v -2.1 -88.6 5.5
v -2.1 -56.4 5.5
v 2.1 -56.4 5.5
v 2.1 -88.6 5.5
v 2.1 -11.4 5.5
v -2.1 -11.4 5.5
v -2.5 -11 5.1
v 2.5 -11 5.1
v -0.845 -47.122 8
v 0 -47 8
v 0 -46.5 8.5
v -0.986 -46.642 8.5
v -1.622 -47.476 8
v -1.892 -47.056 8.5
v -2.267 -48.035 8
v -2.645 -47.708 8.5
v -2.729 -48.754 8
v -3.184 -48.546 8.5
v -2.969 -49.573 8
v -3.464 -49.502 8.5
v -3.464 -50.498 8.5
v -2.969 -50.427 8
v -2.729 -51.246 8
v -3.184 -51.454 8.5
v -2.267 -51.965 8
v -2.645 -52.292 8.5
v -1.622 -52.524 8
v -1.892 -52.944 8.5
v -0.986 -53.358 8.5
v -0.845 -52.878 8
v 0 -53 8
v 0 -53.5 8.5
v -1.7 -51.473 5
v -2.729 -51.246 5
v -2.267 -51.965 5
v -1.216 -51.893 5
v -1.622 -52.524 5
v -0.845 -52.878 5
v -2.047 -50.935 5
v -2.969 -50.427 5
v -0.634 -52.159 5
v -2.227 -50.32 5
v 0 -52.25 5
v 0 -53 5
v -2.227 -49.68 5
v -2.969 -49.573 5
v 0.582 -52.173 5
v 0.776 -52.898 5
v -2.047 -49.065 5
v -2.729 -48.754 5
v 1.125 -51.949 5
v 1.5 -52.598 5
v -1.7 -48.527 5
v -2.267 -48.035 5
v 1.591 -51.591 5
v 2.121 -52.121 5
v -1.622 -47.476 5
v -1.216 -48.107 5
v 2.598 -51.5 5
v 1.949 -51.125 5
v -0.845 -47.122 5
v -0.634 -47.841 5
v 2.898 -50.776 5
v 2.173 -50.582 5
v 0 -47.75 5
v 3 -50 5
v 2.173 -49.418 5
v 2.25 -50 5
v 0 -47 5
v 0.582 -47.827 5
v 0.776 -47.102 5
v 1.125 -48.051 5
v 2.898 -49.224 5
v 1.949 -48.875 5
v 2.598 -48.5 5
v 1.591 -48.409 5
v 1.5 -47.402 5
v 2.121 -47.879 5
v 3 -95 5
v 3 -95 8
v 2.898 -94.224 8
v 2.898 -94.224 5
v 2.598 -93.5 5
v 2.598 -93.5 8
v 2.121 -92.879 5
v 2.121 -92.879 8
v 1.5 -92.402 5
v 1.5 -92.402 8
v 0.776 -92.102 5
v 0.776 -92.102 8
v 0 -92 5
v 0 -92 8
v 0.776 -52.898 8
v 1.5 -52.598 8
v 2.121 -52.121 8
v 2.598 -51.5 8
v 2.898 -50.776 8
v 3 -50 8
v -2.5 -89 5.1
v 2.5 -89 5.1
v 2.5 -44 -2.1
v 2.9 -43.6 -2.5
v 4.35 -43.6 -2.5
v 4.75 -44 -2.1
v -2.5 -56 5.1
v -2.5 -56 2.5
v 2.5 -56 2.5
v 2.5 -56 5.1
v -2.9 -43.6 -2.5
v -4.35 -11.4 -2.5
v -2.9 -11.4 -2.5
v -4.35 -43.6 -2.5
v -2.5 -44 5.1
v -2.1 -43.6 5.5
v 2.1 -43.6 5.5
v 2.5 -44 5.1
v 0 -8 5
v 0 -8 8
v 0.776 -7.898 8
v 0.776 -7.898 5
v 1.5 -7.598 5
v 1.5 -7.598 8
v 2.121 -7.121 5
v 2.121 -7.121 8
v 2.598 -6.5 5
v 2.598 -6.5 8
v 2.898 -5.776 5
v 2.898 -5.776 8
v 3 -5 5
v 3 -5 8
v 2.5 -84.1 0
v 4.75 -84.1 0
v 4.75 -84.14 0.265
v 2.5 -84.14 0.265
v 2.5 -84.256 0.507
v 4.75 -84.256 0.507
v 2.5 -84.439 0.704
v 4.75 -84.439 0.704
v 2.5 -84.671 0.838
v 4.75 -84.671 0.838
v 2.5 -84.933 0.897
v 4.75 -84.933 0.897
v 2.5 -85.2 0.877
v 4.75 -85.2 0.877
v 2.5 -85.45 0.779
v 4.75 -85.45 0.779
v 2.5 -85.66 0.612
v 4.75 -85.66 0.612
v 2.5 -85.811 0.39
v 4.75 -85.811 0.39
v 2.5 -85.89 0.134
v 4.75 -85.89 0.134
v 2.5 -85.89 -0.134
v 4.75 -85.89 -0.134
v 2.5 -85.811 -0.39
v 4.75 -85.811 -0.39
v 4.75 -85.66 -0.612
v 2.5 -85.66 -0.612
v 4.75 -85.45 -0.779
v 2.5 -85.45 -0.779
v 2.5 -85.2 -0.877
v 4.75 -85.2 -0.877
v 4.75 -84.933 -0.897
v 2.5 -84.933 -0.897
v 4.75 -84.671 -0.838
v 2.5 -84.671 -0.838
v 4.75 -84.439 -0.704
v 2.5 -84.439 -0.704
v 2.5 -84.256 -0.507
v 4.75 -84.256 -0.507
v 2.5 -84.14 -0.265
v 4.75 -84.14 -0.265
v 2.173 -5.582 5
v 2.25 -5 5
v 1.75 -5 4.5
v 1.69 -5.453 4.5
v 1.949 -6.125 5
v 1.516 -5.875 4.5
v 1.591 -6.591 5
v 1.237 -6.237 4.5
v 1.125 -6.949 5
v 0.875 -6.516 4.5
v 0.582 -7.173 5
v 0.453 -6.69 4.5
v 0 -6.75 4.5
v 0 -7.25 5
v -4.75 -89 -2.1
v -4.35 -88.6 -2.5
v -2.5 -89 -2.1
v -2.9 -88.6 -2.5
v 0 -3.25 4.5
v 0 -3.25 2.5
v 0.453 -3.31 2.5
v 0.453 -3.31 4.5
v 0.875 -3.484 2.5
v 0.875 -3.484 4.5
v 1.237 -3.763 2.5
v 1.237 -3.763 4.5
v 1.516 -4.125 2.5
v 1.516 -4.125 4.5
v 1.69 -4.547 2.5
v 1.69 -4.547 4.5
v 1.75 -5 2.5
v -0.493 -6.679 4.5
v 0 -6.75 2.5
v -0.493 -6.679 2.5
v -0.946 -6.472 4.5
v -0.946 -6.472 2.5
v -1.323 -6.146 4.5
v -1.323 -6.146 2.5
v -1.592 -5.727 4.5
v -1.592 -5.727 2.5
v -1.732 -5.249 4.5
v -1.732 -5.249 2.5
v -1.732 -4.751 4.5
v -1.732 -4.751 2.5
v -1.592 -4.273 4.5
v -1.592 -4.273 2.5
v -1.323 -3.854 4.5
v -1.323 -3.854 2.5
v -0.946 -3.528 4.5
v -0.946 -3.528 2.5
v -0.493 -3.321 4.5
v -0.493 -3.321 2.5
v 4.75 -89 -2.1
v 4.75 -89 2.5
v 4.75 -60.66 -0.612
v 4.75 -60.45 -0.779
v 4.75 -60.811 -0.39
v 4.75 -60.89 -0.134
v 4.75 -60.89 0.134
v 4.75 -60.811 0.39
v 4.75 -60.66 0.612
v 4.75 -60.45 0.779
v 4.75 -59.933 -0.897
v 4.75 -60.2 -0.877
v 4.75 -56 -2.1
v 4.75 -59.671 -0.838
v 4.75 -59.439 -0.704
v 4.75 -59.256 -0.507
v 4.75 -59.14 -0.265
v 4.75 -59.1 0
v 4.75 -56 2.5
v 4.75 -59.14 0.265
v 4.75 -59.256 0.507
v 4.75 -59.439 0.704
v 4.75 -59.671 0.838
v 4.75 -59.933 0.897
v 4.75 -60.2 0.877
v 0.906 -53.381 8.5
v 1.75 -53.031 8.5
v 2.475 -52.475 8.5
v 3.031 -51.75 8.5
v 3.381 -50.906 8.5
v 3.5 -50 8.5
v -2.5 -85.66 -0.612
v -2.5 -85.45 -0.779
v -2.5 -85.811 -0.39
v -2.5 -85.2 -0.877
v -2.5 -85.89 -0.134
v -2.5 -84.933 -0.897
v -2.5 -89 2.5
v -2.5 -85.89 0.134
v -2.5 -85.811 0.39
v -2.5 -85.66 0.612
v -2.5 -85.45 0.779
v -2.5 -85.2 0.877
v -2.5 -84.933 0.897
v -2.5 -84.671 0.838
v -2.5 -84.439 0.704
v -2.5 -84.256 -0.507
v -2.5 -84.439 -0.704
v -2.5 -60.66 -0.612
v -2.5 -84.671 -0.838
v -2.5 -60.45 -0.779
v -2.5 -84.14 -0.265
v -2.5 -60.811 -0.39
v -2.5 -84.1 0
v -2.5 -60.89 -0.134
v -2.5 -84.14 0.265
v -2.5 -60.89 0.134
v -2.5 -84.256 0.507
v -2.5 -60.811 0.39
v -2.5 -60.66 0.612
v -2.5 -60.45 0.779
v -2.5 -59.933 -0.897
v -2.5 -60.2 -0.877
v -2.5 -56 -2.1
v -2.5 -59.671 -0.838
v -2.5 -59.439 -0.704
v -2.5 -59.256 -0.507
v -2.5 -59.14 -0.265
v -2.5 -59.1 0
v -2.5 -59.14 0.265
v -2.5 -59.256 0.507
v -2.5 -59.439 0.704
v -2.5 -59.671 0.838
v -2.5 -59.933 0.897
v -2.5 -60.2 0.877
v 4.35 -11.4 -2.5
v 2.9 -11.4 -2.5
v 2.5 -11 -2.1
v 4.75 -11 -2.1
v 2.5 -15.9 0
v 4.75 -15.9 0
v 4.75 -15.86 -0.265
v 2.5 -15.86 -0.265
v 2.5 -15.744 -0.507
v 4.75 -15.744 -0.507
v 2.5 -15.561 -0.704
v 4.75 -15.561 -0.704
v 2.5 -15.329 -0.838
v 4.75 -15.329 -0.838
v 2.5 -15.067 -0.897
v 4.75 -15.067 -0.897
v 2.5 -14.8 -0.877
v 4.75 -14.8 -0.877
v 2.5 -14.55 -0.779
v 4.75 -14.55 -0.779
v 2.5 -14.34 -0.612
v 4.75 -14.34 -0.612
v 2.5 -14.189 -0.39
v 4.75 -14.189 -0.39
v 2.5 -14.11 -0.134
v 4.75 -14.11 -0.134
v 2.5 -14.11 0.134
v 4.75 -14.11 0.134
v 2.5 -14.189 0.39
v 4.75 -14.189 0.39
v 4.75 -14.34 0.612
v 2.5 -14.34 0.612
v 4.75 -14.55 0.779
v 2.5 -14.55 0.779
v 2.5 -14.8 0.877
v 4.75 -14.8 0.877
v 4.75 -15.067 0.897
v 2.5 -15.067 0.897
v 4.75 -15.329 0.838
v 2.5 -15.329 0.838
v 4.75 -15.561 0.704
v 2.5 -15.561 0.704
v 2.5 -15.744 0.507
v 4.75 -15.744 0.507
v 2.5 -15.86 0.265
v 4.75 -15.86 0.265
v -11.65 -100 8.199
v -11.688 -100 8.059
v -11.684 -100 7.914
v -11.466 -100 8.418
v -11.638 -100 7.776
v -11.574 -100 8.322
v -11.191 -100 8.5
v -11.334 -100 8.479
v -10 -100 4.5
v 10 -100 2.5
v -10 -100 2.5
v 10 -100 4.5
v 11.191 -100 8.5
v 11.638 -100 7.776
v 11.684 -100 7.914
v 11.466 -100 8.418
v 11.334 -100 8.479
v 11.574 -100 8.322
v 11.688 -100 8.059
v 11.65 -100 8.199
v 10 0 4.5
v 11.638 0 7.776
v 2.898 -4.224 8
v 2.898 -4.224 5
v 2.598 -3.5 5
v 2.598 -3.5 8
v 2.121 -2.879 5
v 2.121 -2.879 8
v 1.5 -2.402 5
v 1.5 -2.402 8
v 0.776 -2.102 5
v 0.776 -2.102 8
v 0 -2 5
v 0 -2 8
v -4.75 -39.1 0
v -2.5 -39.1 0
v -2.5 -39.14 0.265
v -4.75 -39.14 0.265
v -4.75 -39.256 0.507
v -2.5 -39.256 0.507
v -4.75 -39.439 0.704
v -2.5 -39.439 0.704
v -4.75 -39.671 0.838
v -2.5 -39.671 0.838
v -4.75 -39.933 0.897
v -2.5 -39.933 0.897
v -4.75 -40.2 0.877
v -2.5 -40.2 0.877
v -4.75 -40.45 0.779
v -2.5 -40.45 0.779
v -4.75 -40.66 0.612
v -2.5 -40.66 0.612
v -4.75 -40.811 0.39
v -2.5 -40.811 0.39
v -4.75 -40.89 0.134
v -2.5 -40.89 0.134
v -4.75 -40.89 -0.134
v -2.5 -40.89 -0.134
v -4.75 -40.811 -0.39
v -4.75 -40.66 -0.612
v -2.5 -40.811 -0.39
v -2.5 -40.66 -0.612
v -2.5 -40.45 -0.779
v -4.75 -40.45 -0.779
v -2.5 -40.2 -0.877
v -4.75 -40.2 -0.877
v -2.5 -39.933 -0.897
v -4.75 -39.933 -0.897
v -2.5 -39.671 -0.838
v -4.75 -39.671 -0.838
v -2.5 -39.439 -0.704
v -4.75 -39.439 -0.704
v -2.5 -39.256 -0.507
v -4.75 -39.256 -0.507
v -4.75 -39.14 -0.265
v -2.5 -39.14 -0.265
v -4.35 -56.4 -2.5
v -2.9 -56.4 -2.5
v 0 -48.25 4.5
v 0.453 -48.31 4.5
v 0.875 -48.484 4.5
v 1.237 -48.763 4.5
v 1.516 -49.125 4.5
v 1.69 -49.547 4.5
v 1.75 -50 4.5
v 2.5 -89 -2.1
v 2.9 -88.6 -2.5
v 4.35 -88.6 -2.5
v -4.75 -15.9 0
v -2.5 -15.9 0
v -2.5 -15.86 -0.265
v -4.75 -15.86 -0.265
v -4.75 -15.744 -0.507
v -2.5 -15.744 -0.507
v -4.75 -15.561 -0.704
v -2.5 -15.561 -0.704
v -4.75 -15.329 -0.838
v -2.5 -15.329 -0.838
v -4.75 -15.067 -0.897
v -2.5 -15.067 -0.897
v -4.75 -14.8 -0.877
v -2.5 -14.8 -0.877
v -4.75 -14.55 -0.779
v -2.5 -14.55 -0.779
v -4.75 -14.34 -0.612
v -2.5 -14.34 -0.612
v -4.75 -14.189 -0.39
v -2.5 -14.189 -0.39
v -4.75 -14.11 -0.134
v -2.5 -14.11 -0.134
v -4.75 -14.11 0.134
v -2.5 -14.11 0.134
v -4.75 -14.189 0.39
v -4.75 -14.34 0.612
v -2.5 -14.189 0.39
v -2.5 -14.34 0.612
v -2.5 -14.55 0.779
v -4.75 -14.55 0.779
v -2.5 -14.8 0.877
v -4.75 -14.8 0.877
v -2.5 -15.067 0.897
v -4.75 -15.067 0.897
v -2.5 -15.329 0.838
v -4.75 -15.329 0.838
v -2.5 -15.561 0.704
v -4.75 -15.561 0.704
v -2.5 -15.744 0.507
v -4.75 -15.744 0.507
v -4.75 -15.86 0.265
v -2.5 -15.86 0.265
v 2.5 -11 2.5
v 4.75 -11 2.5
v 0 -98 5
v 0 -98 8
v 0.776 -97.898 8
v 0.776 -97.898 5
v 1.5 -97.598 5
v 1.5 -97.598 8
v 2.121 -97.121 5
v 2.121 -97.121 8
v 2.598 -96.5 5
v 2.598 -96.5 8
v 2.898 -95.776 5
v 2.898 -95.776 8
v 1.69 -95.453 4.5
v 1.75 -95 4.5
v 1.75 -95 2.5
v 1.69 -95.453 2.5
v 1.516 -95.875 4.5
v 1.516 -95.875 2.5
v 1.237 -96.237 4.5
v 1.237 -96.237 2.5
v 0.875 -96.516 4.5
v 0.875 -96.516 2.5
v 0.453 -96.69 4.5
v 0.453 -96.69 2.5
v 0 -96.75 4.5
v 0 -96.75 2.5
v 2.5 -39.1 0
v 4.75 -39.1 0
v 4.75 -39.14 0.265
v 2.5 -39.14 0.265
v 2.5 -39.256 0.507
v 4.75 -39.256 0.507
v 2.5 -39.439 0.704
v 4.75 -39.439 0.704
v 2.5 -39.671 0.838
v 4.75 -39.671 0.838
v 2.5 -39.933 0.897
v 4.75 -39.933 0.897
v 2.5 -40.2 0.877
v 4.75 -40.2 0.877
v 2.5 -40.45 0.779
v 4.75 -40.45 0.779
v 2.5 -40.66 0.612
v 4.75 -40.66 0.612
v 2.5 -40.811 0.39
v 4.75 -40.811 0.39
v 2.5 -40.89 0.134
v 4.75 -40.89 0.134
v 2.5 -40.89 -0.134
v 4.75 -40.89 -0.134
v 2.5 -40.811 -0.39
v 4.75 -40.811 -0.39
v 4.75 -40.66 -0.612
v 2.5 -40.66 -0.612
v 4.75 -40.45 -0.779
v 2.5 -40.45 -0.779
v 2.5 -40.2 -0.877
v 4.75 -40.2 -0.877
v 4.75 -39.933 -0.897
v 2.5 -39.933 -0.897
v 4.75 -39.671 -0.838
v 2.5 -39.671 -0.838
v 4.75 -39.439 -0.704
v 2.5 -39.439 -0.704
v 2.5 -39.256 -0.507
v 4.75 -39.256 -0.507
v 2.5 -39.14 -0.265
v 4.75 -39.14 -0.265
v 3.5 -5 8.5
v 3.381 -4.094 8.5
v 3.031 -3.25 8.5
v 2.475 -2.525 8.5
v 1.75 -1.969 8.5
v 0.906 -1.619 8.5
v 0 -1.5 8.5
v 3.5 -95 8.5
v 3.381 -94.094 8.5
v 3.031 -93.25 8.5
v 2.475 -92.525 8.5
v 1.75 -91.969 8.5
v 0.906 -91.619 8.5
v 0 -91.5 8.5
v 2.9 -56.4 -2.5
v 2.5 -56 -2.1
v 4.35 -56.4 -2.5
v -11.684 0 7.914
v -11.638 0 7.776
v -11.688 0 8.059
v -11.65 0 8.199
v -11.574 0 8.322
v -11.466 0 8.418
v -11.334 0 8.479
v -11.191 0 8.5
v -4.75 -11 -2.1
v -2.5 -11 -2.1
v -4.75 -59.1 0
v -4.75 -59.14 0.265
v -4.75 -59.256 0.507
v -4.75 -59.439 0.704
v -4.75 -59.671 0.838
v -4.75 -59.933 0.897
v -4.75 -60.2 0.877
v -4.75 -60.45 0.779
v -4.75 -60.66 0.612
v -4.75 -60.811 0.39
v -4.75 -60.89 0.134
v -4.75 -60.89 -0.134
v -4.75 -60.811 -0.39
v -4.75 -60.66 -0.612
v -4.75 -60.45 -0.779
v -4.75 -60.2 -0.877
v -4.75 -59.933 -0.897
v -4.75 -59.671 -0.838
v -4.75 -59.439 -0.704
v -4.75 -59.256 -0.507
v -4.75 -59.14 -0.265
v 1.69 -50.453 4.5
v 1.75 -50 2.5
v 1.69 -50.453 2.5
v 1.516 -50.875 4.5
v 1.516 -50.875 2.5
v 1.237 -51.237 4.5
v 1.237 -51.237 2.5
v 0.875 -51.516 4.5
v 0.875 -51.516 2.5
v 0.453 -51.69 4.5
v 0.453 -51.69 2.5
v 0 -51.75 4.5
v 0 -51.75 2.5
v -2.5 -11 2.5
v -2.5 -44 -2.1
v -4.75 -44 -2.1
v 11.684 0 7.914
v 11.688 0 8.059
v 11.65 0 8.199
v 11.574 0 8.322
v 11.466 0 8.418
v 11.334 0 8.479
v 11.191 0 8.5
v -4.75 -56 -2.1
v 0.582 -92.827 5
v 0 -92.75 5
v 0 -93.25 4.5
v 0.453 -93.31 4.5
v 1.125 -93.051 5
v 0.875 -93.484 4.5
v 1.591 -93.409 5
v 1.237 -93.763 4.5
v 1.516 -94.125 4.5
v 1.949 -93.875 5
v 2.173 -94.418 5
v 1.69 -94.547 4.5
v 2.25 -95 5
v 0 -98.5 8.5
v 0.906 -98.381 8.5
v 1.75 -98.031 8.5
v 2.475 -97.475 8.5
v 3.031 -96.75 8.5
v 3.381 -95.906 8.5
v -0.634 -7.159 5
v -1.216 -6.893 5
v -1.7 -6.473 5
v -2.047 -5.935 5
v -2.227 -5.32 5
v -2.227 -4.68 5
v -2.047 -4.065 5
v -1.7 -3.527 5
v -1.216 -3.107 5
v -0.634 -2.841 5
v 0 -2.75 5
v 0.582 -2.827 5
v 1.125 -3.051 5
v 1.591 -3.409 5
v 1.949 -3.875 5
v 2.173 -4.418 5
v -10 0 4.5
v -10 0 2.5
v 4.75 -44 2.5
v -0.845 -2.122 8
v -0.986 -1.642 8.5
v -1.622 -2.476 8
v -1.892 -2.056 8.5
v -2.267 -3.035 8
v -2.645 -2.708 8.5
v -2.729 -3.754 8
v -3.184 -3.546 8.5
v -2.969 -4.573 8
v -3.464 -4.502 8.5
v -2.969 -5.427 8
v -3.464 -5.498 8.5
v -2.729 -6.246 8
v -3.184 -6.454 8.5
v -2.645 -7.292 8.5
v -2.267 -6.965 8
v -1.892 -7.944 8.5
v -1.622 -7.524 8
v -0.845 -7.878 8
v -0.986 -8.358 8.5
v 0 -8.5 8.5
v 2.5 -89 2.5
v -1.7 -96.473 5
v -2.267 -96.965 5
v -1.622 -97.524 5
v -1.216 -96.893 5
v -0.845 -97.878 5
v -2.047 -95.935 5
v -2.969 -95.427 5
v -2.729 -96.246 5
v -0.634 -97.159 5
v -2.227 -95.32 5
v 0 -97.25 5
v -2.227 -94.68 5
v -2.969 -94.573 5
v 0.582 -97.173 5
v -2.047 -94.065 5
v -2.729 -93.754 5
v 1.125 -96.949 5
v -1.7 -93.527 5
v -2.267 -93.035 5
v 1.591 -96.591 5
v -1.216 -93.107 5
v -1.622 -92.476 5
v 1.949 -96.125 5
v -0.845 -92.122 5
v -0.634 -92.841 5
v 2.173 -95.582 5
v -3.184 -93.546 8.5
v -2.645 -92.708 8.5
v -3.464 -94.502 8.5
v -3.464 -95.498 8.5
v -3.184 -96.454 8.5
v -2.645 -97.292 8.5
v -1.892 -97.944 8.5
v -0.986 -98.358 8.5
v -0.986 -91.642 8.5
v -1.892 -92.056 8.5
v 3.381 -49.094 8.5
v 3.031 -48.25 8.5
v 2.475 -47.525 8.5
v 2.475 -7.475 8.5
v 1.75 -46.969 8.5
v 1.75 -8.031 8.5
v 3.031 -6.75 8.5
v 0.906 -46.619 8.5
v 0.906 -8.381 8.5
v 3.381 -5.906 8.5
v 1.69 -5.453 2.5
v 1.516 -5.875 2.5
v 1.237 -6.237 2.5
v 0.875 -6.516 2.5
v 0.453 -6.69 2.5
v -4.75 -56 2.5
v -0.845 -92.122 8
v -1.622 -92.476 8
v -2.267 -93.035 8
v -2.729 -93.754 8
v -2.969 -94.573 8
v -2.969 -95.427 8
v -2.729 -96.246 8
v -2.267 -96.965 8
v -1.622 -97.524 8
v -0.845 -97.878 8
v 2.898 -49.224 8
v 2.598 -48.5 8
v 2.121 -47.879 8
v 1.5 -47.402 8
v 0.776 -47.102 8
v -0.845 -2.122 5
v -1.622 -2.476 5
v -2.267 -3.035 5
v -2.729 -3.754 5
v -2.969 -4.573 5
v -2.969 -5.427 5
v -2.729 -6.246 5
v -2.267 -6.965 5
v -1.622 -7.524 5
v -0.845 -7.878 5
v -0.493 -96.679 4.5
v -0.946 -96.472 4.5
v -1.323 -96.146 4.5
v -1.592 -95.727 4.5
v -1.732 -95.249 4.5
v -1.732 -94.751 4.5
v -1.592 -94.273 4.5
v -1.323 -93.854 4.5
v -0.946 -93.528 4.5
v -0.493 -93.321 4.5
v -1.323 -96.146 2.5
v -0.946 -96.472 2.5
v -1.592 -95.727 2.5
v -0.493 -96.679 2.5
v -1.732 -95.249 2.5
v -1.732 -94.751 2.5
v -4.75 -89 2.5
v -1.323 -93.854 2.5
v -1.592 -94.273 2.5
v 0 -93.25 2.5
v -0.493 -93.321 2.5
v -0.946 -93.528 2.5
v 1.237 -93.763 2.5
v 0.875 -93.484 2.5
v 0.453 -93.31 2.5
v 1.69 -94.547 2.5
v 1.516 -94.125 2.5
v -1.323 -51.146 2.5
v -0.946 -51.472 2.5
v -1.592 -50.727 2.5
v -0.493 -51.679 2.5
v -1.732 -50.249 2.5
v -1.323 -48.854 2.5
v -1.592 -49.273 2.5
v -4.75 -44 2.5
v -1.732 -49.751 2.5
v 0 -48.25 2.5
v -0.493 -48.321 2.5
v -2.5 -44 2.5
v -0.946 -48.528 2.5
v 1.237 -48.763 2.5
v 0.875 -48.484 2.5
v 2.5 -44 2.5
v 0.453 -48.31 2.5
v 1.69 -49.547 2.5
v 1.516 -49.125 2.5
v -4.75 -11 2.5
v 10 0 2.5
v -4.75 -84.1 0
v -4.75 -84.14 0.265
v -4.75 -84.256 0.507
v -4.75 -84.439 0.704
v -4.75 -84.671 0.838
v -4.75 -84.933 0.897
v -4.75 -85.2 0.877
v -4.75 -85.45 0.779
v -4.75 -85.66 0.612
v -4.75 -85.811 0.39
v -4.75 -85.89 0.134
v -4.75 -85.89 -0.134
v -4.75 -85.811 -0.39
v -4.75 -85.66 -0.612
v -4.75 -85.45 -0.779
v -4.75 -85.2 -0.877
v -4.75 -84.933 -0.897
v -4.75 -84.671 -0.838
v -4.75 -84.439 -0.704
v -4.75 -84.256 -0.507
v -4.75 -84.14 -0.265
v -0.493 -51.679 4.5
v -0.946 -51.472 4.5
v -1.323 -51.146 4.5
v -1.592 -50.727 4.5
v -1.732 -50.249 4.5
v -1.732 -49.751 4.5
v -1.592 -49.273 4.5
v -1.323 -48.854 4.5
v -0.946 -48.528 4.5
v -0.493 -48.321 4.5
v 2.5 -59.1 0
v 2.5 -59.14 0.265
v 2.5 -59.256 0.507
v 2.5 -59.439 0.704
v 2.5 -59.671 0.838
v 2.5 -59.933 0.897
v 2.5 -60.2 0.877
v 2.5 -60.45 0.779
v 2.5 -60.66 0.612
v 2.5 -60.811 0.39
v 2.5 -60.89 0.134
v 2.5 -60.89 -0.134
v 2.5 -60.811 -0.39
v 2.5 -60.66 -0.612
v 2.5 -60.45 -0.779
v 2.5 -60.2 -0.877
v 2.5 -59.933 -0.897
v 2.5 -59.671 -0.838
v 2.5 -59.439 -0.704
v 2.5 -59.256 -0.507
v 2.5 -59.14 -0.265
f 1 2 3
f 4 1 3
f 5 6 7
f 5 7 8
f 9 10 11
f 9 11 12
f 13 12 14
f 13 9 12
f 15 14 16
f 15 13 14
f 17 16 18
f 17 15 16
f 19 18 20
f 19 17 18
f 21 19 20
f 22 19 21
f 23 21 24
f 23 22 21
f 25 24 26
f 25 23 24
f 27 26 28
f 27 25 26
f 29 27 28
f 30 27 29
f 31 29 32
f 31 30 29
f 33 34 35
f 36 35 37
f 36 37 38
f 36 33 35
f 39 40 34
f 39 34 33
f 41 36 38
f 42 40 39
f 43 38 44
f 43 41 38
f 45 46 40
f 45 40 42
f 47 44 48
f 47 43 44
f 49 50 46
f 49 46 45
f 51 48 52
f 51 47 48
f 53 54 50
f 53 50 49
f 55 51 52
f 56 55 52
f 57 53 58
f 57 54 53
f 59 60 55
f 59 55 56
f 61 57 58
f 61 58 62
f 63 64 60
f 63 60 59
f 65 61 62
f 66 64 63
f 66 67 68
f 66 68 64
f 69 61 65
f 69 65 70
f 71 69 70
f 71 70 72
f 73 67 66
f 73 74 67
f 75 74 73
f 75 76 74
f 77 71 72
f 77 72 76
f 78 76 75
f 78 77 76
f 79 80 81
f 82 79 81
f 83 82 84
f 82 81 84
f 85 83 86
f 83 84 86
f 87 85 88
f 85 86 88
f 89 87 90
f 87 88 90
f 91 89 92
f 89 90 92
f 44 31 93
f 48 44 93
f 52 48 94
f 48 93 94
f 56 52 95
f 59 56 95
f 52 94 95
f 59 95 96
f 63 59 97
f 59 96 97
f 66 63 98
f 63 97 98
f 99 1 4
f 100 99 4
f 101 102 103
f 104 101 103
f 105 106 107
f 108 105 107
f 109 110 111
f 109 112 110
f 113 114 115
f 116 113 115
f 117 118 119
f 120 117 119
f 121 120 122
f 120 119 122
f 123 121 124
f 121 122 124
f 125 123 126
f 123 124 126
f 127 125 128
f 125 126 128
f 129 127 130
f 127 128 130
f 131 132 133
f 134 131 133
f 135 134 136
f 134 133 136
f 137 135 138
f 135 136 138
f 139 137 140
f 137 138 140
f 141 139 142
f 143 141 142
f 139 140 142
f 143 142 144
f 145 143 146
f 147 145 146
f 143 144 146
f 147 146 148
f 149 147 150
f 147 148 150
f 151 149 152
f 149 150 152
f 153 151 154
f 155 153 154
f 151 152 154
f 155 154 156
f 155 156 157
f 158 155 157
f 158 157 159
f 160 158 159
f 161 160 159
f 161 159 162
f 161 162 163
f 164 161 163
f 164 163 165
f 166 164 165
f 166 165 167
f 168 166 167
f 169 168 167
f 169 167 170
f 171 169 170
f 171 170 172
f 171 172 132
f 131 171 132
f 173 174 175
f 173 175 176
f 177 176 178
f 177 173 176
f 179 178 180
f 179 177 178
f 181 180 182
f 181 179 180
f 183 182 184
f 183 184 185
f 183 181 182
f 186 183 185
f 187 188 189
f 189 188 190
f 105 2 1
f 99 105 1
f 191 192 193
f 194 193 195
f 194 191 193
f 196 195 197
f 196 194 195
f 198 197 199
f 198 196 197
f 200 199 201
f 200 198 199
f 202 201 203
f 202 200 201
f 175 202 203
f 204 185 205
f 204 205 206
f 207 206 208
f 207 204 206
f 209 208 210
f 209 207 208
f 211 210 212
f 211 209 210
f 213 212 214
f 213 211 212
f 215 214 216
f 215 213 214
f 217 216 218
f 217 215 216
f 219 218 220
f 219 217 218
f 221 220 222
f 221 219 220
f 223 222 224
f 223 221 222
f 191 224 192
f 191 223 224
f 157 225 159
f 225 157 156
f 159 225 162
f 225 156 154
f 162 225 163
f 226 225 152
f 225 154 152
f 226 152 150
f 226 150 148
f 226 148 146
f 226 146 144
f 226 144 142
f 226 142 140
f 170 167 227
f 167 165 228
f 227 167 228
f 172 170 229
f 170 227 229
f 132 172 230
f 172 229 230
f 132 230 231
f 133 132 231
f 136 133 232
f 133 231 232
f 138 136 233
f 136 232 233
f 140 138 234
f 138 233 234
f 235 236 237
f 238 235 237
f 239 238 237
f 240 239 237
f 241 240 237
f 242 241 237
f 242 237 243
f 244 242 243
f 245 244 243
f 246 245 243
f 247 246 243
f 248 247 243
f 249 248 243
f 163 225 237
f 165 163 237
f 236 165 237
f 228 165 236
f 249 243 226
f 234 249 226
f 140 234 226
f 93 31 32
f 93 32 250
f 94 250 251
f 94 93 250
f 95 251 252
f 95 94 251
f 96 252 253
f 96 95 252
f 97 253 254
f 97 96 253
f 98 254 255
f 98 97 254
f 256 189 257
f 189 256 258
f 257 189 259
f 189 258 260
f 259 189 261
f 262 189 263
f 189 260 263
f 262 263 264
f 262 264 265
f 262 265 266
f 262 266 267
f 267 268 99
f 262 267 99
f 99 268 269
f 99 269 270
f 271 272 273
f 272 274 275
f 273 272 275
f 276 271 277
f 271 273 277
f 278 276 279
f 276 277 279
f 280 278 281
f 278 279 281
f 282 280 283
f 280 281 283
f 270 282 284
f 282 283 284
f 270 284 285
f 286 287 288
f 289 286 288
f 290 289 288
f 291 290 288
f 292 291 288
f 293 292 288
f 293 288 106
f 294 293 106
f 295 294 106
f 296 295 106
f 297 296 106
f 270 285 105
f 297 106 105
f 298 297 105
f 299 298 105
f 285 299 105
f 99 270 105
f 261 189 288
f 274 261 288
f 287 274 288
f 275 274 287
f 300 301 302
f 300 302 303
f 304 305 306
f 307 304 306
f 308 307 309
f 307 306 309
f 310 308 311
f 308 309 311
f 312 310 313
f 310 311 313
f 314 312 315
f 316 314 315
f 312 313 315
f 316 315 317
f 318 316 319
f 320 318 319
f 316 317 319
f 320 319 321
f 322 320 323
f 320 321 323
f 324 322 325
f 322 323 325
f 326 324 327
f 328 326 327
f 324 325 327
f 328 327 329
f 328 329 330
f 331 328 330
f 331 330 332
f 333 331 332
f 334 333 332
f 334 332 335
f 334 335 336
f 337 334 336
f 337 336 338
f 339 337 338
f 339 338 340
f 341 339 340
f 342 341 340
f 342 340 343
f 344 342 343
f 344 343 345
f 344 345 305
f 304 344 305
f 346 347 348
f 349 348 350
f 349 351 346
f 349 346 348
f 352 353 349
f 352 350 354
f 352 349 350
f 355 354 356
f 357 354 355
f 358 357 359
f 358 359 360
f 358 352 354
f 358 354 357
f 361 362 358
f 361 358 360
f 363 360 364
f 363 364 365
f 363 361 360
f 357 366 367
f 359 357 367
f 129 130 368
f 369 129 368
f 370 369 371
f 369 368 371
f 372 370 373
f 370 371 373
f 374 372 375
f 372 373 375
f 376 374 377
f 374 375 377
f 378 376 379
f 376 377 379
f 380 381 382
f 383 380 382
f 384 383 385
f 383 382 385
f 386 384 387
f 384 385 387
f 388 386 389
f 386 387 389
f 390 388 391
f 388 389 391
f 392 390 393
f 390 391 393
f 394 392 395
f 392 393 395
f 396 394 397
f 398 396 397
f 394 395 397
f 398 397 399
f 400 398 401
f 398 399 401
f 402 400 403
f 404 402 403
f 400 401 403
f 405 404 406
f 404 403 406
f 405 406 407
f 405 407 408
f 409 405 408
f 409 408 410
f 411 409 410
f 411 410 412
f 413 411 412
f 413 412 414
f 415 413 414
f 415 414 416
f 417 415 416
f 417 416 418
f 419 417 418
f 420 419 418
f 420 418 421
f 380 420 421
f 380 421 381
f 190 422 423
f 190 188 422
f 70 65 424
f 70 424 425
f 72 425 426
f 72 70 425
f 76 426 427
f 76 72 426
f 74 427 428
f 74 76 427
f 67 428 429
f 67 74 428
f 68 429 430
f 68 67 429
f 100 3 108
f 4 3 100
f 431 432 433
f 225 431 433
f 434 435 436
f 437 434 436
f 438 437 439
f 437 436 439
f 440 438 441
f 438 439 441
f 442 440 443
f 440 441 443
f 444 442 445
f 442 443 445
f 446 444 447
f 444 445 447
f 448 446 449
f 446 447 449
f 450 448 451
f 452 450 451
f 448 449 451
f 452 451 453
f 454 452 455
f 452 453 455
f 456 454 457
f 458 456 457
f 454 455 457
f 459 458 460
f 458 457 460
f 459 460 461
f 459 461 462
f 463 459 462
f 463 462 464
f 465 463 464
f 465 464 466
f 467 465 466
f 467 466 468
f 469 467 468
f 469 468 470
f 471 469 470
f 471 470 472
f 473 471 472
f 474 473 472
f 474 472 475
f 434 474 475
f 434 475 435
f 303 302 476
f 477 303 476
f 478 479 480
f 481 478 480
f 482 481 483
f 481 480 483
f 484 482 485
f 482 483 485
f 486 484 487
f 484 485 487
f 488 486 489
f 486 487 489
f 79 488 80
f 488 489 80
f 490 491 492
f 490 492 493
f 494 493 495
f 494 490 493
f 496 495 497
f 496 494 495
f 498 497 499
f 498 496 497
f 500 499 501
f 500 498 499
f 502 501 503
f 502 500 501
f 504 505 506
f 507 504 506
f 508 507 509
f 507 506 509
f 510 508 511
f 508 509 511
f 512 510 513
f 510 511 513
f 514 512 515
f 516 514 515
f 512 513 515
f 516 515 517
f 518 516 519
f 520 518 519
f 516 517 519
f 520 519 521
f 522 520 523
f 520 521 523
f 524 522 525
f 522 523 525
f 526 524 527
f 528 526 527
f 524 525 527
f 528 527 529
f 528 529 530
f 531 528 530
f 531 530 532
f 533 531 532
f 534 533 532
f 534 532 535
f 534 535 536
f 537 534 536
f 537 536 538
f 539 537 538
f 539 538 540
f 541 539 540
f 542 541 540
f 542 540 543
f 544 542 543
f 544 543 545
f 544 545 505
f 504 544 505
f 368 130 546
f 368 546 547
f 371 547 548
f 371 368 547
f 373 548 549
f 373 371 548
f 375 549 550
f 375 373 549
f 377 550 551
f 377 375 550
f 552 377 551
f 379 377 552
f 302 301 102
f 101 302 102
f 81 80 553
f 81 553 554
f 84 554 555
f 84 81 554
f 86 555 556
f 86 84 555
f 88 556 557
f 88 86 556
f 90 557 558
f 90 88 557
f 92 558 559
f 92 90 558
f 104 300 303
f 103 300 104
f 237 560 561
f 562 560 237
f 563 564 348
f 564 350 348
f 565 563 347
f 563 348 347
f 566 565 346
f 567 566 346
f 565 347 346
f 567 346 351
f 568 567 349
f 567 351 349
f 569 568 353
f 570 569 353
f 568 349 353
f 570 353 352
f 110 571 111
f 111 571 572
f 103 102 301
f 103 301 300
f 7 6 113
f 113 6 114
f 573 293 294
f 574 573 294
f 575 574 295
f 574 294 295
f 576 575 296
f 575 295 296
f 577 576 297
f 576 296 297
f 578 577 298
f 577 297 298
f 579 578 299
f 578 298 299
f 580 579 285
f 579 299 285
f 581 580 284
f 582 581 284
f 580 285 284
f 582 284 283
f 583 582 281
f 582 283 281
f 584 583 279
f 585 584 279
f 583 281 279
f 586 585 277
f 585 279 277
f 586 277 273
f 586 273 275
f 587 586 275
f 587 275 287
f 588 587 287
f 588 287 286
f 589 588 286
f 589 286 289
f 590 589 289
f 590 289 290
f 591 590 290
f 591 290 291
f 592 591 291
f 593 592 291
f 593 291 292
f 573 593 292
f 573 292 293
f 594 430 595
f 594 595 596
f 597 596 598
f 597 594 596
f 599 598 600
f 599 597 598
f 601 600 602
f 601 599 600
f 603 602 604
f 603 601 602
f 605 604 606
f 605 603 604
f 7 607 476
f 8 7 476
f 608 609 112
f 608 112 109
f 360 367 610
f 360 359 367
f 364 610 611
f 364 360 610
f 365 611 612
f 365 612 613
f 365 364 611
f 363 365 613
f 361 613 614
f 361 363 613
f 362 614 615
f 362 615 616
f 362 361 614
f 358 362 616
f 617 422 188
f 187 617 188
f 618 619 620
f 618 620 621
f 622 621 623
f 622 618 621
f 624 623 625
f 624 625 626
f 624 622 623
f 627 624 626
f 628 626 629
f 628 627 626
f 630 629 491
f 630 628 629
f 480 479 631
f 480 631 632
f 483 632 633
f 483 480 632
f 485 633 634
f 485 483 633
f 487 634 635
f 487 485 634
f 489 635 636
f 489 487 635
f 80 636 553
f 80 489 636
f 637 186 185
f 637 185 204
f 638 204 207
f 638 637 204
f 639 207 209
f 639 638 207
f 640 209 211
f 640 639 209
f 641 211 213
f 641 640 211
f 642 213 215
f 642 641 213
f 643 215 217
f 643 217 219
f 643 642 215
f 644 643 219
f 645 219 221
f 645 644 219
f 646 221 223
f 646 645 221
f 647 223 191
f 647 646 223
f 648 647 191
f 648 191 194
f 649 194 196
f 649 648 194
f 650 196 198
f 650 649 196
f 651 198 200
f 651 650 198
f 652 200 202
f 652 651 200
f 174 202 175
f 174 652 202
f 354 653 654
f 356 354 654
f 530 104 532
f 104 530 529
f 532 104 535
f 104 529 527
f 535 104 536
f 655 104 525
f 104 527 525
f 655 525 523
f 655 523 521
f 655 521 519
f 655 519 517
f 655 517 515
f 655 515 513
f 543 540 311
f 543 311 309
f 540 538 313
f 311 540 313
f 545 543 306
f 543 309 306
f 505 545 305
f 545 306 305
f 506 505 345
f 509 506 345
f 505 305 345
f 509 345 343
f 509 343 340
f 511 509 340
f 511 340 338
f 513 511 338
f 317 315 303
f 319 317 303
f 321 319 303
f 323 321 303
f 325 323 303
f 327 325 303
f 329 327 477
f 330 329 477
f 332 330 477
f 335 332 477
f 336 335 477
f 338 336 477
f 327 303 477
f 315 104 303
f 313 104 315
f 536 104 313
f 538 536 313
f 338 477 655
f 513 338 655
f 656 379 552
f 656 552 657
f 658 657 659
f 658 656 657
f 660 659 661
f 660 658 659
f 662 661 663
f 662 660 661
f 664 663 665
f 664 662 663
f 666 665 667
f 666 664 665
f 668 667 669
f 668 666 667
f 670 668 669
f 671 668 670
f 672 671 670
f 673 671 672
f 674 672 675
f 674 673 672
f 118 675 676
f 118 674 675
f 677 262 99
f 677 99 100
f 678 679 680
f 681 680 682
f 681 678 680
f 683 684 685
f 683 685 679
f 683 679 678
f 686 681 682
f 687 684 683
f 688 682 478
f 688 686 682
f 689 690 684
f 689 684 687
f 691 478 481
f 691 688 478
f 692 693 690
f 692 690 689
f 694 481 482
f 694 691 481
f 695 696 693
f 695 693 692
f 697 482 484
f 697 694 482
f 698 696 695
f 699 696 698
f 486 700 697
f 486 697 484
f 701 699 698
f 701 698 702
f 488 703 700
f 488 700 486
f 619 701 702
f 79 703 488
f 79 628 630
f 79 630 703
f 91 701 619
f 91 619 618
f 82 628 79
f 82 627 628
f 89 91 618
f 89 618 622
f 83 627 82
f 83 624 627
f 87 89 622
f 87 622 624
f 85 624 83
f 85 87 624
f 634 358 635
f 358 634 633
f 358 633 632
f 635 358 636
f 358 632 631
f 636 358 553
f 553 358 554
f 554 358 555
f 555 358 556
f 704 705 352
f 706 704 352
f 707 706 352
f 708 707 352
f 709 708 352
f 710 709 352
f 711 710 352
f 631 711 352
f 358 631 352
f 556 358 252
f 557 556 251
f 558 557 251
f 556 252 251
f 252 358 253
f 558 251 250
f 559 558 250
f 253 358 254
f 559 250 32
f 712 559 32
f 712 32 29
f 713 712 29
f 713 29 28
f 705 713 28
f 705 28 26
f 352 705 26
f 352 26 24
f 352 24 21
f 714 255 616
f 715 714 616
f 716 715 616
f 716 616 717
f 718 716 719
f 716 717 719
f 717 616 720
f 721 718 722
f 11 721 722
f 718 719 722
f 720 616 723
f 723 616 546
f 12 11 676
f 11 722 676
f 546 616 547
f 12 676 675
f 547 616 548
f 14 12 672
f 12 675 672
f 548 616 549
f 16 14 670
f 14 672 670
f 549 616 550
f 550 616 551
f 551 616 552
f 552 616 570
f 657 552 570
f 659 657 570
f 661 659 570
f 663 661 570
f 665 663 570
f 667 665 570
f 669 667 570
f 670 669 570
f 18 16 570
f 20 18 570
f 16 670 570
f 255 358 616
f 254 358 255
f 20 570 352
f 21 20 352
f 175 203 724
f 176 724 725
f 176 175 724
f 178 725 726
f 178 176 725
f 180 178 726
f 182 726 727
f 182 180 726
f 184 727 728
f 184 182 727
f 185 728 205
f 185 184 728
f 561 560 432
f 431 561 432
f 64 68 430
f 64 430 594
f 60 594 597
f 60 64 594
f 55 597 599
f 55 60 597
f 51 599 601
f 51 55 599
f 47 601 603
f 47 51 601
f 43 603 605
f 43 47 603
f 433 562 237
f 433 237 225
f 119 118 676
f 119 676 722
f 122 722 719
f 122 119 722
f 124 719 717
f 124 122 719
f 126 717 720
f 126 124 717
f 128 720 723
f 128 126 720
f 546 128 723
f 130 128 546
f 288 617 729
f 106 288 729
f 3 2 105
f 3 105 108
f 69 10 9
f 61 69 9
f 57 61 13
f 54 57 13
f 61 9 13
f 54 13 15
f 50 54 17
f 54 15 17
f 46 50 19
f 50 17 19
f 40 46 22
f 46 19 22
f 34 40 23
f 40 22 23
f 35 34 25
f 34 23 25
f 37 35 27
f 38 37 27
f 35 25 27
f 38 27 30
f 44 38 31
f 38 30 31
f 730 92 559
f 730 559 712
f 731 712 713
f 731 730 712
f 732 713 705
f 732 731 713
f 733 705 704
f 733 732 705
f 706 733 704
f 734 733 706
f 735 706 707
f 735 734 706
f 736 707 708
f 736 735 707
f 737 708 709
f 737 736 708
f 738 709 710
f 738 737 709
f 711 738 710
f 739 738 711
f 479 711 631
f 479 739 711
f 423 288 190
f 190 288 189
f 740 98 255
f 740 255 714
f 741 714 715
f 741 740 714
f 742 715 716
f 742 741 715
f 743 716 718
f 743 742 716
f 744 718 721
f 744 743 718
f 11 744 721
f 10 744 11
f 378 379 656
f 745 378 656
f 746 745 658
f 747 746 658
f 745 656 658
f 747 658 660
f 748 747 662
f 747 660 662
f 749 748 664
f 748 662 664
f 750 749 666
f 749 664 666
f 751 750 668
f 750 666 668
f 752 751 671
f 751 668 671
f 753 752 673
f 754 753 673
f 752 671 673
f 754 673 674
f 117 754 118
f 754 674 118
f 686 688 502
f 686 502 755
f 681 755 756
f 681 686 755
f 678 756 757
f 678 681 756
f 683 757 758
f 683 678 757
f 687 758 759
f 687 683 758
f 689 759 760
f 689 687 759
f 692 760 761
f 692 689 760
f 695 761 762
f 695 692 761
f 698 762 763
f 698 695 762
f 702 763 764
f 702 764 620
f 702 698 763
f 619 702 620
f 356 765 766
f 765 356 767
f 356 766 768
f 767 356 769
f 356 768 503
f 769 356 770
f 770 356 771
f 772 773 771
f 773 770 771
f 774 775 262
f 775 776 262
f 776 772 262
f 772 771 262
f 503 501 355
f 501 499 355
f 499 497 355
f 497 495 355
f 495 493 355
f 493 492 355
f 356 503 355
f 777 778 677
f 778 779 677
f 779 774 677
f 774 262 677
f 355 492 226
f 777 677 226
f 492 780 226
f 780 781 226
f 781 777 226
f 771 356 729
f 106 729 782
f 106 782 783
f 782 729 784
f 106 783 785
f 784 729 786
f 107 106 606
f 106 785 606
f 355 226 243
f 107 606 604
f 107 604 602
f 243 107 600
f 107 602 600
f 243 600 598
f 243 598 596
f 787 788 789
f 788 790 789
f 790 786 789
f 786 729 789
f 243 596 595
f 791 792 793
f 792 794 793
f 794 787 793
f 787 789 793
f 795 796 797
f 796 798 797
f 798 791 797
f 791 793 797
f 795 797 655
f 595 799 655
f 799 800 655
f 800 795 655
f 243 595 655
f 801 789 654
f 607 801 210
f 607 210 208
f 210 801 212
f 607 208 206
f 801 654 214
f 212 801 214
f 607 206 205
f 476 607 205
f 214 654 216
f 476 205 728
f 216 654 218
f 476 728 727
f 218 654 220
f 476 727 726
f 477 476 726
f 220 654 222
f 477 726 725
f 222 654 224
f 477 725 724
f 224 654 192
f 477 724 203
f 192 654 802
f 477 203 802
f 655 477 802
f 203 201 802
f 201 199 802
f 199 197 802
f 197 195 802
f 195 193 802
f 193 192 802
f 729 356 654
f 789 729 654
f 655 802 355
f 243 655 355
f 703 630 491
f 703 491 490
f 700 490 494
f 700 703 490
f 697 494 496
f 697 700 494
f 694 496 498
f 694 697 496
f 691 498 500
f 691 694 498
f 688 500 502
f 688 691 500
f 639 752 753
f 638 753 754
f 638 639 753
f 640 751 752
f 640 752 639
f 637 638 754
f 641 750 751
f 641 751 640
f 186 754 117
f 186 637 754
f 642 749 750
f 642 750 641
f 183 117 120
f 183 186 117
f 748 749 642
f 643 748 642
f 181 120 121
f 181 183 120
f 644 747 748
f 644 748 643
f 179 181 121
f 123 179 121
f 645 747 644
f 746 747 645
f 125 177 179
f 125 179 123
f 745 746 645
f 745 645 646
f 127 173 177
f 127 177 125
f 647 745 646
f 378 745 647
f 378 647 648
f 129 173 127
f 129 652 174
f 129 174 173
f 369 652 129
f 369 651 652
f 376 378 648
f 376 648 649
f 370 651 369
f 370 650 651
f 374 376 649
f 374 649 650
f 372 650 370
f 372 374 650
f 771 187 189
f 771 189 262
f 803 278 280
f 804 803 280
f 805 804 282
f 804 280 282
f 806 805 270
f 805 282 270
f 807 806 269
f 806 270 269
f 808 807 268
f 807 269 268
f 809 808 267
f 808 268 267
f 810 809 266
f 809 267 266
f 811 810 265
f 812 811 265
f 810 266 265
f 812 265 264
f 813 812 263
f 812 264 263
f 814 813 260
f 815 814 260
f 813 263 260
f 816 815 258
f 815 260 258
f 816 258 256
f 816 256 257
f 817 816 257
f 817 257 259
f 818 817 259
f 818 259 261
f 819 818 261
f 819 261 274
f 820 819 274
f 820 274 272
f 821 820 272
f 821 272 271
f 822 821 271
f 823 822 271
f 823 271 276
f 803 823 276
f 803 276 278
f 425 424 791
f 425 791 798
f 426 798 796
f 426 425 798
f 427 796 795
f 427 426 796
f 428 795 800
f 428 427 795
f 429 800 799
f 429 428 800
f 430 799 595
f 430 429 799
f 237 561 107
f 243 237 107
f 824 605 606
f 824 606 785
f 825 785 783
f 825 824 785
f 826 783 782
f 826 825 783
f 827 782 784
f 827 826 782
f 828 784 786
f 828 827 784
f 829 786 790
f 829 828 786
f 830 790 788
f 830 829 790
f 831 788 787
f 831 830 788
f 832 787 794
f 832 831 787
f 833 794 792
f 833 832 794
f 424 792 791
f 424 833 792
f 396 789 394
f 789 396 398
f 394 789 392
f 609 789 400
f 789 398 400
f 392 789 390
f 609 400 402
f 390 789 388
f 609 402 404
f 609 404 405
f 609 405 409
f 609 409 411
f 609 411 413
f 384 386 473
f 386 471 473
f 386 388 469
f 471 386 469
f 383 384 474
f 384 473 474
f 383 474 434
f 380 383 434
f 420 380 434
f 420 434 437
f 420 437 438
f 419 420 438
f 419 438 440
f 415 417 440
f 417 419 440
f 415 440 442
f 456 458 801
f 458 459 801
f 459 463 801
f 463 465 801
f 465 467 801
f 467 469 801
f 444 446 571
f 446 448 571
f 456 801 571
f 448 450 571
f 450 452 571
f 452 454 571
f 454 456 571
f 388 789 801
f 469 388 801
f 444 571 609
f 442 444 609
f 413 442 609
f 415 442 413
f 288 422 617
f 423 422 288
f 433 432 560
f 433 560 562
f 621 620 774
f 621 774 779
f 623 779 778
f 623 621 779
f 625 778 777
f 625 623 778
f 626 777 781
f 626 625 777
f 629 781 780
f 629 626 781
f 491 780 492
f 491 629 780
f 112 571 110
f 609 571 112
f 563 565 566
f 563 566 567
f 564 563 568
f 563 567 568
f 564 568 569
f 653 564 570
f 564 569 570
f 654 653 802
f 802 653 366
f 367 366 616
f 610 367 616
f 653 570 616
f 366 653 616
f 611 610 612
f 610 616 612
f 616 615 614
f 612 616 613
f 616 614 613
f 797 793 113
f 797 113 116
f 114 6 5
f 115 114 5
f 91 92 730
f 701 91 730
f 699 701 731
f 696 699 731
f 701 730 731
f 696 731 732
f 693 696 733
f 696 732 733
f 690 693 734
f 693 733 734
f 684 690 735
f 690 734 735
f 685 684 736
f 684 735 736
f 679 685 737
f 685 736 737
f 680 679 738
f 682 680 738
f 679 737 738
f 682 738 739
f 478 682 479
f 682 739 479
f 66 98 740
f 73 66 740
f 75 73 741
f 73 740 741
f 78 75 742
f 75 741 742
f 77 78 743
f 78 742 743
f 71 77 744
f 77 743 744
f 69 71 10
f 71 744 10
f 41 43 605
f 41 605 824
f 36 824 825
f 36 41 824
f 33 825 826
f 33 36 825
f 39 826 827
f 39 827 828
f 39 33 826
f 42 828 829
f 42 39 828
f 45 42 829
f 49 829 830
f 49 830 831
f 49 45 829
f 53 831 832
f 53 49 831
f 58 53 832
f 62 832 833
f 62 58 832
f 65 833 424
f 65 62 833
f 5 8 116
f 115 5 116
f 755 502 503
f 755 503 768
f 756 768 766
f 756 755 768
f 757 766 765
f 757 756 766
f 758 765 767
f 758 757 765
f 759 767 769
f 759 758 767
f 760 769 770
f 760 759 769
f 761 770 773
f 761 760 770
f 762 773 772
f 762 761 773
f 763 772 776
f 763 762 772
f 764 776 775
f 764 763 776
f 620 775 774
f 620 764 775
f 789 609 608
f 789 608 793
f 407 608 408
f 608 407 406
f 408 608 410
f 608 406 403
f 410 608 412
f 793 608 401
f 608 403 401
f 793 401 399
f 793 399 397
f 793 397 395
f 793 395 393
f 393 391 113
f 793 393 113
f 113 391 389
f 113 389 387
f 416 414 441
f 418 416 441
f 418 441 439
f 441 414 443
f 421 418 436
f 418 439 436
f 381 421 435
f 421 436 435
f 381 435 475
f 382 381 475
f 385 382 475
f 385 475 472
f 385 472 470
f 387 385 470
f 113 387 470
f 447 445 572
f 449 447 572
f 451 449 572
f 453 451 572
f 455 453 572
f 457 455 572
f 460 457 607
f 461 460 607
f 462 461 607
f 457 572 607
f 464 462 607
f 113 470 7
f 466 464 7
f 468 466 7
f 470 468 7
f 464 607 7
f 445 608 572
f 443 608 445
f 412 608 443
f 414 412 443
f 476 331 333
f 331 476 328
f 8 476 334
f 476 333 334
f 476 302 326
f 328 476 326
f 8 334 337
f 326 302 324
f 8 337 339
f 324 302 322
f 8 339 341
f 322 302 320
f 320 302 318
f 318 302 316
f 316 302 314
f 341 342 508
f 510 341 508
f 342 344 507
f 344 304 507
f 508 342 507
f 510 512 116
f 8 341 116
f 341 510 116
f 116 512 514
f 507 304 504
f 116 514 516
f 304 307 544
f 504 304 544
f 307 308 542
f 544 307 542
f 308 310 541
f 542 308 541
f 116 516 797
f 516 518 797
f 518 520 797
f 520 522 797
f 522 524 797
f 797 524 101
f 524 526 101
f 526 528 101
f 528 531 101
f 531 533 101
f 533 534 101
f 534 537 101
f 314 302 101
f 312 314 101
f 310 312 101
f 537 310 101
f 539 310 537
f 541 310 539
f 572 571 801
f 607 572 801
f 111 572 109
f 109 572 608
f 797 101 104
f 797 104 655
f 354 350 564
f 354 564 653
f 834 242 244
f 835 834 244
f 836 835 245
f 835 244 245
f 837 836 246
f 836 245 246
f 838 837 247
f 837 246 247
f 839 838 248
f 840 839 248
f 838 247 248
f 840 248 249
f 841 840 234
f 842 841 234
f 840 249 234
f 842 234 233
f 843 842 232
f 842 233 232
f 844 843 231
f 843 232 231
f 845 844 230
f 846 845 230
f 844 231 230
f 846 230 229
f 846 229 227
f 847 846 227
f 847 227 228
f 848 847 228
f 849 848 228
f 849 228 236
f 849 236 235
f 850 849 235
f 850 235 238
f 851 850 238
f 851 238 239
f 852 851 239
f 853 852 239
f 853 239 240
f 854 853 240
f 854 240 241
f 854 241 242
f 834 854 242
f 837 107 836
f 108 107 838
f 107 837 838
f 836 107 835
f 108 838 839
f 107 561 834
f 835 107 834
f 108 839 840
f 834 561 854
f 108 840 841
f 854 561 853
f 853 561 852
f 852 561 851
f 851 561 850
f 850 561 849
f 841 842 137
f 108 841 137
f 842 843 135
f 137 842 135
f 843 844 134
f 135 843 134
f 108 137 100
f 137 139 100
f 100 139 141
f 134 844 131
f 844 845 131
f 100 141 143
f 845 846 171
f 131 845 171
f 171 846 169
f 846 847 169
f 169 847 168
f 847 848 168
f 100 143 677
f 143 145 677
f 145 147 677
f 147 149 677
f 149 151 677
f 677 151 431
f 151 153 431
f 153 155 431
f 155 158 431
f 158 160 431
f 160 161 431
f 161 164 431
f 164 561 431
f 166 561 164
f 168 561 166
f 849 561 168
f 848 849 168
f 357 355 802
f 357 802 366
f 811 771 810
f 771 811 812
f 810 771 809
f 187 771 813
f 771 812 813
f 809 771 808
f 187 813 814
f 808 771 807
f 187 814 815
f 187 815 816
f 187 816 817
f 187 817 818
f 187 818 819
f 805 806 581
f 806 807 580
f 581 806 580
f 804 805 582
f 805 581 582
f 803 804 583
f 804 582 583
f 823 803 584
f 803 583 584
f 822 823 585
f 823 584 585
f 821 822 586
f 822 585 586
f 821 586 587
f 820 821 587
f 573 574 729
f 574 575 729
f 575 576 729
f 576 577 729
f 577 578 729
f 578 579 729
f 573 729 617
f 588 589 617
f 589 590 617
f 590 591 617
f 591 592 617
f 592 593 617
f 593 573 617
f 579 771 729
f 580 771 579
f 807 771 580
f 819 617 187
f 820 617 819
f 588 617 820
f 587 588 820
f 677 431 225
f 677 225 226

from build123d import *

# Parameters (mm, degrees)
F1_DEPTH  = 100
F2_W      = 5
F2_H      = 10
F3_DEPTH  = 5
F4_R      = 0.9
F5_DEPTH  = 25
F7_DEPTH  = 3.5
F8_DEPTH  = 11.001
F9_SIZE   = 0.5
F10_W     = 11
F10_H     = 5
F10_W_2   = 12
F11_DEPTH = 25
F12_W     = 5
F12_H     = 33
F13_DEPTH = 8
F14_W     = 5
F14_H     = 33
F15_DEPTH = 8
F16_SIZE  = 0.4
F17_R     = 0.5


with BuildPart() as f1:
    # F0 (on Front) → F1 (new body)
    with BuildSketch(Plane.XZ):
        Polygon((2.5, -2.5), (4.75, -2.5), (4.75, 2.5), (10, 2.5), (10, 4.5), (12, 8.5), (10, 8.5), (6, 8.5), (-6, 8.5), (-10, 8.5), (-12, 8.5), (-10, 4.5), (-10, 2.5), (-4.75, 2.5), (-4.75, -2.5), (-2.5, -2.5), (-2.5, 2.5), (2.5, 2.5), align=None)
    extrude(amount=F1_DEPTH)

    # F2 (on face) → F3 (join)
    with BuildSketch(Plane(origin=(0, 0, 2.5), x_dir=(1, 0, 0), z_dir=(0, 0, -1))):
        with Locations((0, 95)):
            Rectangle(F2_W, F2_H)
        Polygon((-2.5, 50), (-2.5, 45), (2.5, 45), (2.5, 50), (2.5, 55), (-2.5, 55), align=None)
        with Locations((0, 5)):
            Rectangle(F2_W, F2_H)
    extrude(amount=F3_DEPTH)

    # F4 (on face) → F5 (cut)
    with BuildSketch(Plane.YZ.offset(4.75)):
        with Locations((-85, 0)):
            Circle(F4_R)
        with Locations((-40, 0)):
            Circle(F4_R)
        with BuildLine():
            ThreePointArc((-14.1, 0), (-15, 0.9), (-15.9, 0))
            Line((-15.9, 0), (-14.1, 0))
        make_face()
        with BuildLine():
            Line((-14.1, 0), (-15.9, 0))
            ThreePointArc((-15.9, 0), (-15, -0.9), (-14.1, 0))
        make_face()
        with Locations((-60, 0)):
            Circle(F4_R)
    extrude(amount=-F5_DEPTH, mode=Mode.SUBTRACT)

    # F6 (on face) → F7 (cut)
    with BuildSketch(Plane.XY.offset(8.5)):
        with BuildLine():
            ThreePointArc((0, -92), (-3, -95), (0, -98))
            Line((0, -98), (0, -96.75))
            ThreePointArc((0, -96.75), (-1.75, -95), (0, -93.25))
            Line((0, -93.25), (0, -92))
        make_face()
        with BuildLine():
            ThreePointArc((0, -2), (-3, -5), (0, -8))
            Line((0, -8), (0, -6.75))
            ThreePointArc((0, -6.75), (-1.75, -5), (0, -3.25))
            Line((0, -3.25), (0, -2))
        make_face()
        with BuildLine():
            Line((0, -6.75), (0, -8))
            ThreePointArc((0, -8), (2.1213203436, -7.1213203436), (3, -5))
            ThreePointArc((3, -5), (2.1213203436, -2.8786796564), (0, -2))
            Line((0, -2), (0, -3.25))
            ThreePointArc((0, -3.25), (1.2374368671, -3.7625631329), (1.75, -5))
            ThreePointArc((1.75, -5), (1.2374368671, -6.2374368671), (0, -6.75))
        make_face()
        with BuildLine():
            ThreePointArc((0, -47), (-3, -50), (0, -53))
            Line((0, -53), (0, -51.75))
            ThreePointArc((0, -51.75), (-1.75, -50), (0, -48.25))
            Line((0, -48.25), (0, -47))
        make_face()
        with BuildLine():
            Line((0, -51.75), (0, -53))
            ThreePointArc((0, -53), (2.1213203436, -52.1213203436), (3, -50))
            ThreePointArc((3, -50), (2.1213203436, -47.8786796564), (0, -47))
            Line((0, -47), (0, -48.25))
            ThreePointArc((0, -48.25), (1.2374368671, -48.7625631329), (1.75, -50))
            ThreePointArc((1.75, -50), (1.2374368671, -51.2374368671), (0, -51.75))
        make_face()
        with BuildLine():
            Line((0, -96.75), (0, -98))
            ThreePointArc((0, -98), (2.1213203436, -97.1213203436), (3, -95))
            ThreePointArc((3, -95), (2.1213203436, -92.8786796564), (0, -92))
            Line((0, -92), (0, -93.25))
            ThreePointArc((0, -93.25), (1.2374368671, -93.7625631329), (1.75, -95))
            ThreePointArc((1.75, -95), (1.2374368671, -96.2374368671), (0, -96.75))
        make_face()
    extrude(amount=-F7_DEPTH, mode=Mode.SUBTRACT)

    # F8 (cut, through all): faces of the model
    f8_faces = [f1.faces().sort_by_distance(p)[0] for p in [
        (0, -5, 8.5),
        (0, -50, 8.5),
        (0, -95, 8.5),
    ]]
    extrude(f8_faces, amount=-F8_DEPTH, mode=Mode.SUBTRACT)

    # F9
    f9_edges = [f1.edges().sort_by_distance(p)[0] for p in [
        (0, -2, 8.5),
        (0, -47, 8.5),
        (0, -92, 8.5),
        (0, -6.75, 5),
        (0, -51.75, 5),
        (0, -96.75, 5),
        (0, -96.75, -2.5),
        (0, -51.75, -2.5),
        (0, -6.75, -2.5),
    ]]
    chamfer(f9_edges, length=F9_SIZE)

    # F10 (on face) → F11 (cut)
    with BuildSketch(Plane(origin=(-4.75, 0, 0), x_dir=(0, -1, 0), z_dir=(-1, 0, 0))):
        with Locations((5.5, 0)):
            Rectangle(F10_W, F10_H)
        with Locations((50, 0)):
            Rectangle(F10_W_2, F10_H)
        with Locations((94.5, 0)):
            Rectangle(F10_W, F10_H)
    extrude(amount=-F11_DEPTH, mode=Mode.SUBTRACT)

    # F12 (on face) → F13 (cut)
    with BuildSketch(Plane(origin=(0, 0, -2.5), x_dir=(1, 0, 0), z_dir=(0, 0, -1))):
        with Locations((0, 72.5)):
            Rectangle(F12_W, F12_H)
    extrude(amount=-F13_DEPTH, mode=Mode.SUBTRACT)

    # F14 (on face) → F15 (cut)
    with BuildSketch(Plane(origin=(0, 0, -2.5), x_dir=(1, 0, 0), z_dir=(0, 0, -1))):
        with Locations((0, 27.5)):
            Rectangle(F14_W, F14_H)
    extrude(amount=-F15_DEPTH, mode=Mode.SUBTRACT)

    # F16
    f16_edges = [f1.edges().sort_by_distance(p)[0] for p in [
        (-3.625, -11, -2.5),
        (-2.5, -27.5, -2.5),
        (-3.625, -44, -2.5),
        (-4.75, -27.5, -2.5),
        (4.75, -27.5, -2.5),
        (3.625, -44, -2.5),
        (2.5, -27.5, -2.5),
        (3.625, -11, -2.5),
        (4.75, -72.5, -2.5),
        (3.625, -89, -2.5),
        (2.5, -72.5, -2.5),
        (3.625, -56, -2.5),
        (-3.625, -56, -2.5),
        (-2.5, -72.5, -2.5),
        (-3.625, -89, -2.5),
        (-4.75, -72.5, -2.5),
        (0, -44, 5.5),
        (-2.5, -27.5, 5.5),
        (0, -11, 5.5),
        (2.5, -27.5, 5.5),
        (0, -89, 5.5),
        (-2.5, -72.5, 5.5),
        (0, -56, 5.5),
        (2.5, -72.5, 5.5),
    ]]
    chamfer(f16_edges, length=F16_SIZE)

    # F17
    f17_edges = [f1.edges().sort_by_distance(p)[0] for p in [
        (12, -50, 8.5),
        (-12, -50, 8.5),
    ]]
    fillet(f17_edges, radius=F17_R)


solid = f1.part
